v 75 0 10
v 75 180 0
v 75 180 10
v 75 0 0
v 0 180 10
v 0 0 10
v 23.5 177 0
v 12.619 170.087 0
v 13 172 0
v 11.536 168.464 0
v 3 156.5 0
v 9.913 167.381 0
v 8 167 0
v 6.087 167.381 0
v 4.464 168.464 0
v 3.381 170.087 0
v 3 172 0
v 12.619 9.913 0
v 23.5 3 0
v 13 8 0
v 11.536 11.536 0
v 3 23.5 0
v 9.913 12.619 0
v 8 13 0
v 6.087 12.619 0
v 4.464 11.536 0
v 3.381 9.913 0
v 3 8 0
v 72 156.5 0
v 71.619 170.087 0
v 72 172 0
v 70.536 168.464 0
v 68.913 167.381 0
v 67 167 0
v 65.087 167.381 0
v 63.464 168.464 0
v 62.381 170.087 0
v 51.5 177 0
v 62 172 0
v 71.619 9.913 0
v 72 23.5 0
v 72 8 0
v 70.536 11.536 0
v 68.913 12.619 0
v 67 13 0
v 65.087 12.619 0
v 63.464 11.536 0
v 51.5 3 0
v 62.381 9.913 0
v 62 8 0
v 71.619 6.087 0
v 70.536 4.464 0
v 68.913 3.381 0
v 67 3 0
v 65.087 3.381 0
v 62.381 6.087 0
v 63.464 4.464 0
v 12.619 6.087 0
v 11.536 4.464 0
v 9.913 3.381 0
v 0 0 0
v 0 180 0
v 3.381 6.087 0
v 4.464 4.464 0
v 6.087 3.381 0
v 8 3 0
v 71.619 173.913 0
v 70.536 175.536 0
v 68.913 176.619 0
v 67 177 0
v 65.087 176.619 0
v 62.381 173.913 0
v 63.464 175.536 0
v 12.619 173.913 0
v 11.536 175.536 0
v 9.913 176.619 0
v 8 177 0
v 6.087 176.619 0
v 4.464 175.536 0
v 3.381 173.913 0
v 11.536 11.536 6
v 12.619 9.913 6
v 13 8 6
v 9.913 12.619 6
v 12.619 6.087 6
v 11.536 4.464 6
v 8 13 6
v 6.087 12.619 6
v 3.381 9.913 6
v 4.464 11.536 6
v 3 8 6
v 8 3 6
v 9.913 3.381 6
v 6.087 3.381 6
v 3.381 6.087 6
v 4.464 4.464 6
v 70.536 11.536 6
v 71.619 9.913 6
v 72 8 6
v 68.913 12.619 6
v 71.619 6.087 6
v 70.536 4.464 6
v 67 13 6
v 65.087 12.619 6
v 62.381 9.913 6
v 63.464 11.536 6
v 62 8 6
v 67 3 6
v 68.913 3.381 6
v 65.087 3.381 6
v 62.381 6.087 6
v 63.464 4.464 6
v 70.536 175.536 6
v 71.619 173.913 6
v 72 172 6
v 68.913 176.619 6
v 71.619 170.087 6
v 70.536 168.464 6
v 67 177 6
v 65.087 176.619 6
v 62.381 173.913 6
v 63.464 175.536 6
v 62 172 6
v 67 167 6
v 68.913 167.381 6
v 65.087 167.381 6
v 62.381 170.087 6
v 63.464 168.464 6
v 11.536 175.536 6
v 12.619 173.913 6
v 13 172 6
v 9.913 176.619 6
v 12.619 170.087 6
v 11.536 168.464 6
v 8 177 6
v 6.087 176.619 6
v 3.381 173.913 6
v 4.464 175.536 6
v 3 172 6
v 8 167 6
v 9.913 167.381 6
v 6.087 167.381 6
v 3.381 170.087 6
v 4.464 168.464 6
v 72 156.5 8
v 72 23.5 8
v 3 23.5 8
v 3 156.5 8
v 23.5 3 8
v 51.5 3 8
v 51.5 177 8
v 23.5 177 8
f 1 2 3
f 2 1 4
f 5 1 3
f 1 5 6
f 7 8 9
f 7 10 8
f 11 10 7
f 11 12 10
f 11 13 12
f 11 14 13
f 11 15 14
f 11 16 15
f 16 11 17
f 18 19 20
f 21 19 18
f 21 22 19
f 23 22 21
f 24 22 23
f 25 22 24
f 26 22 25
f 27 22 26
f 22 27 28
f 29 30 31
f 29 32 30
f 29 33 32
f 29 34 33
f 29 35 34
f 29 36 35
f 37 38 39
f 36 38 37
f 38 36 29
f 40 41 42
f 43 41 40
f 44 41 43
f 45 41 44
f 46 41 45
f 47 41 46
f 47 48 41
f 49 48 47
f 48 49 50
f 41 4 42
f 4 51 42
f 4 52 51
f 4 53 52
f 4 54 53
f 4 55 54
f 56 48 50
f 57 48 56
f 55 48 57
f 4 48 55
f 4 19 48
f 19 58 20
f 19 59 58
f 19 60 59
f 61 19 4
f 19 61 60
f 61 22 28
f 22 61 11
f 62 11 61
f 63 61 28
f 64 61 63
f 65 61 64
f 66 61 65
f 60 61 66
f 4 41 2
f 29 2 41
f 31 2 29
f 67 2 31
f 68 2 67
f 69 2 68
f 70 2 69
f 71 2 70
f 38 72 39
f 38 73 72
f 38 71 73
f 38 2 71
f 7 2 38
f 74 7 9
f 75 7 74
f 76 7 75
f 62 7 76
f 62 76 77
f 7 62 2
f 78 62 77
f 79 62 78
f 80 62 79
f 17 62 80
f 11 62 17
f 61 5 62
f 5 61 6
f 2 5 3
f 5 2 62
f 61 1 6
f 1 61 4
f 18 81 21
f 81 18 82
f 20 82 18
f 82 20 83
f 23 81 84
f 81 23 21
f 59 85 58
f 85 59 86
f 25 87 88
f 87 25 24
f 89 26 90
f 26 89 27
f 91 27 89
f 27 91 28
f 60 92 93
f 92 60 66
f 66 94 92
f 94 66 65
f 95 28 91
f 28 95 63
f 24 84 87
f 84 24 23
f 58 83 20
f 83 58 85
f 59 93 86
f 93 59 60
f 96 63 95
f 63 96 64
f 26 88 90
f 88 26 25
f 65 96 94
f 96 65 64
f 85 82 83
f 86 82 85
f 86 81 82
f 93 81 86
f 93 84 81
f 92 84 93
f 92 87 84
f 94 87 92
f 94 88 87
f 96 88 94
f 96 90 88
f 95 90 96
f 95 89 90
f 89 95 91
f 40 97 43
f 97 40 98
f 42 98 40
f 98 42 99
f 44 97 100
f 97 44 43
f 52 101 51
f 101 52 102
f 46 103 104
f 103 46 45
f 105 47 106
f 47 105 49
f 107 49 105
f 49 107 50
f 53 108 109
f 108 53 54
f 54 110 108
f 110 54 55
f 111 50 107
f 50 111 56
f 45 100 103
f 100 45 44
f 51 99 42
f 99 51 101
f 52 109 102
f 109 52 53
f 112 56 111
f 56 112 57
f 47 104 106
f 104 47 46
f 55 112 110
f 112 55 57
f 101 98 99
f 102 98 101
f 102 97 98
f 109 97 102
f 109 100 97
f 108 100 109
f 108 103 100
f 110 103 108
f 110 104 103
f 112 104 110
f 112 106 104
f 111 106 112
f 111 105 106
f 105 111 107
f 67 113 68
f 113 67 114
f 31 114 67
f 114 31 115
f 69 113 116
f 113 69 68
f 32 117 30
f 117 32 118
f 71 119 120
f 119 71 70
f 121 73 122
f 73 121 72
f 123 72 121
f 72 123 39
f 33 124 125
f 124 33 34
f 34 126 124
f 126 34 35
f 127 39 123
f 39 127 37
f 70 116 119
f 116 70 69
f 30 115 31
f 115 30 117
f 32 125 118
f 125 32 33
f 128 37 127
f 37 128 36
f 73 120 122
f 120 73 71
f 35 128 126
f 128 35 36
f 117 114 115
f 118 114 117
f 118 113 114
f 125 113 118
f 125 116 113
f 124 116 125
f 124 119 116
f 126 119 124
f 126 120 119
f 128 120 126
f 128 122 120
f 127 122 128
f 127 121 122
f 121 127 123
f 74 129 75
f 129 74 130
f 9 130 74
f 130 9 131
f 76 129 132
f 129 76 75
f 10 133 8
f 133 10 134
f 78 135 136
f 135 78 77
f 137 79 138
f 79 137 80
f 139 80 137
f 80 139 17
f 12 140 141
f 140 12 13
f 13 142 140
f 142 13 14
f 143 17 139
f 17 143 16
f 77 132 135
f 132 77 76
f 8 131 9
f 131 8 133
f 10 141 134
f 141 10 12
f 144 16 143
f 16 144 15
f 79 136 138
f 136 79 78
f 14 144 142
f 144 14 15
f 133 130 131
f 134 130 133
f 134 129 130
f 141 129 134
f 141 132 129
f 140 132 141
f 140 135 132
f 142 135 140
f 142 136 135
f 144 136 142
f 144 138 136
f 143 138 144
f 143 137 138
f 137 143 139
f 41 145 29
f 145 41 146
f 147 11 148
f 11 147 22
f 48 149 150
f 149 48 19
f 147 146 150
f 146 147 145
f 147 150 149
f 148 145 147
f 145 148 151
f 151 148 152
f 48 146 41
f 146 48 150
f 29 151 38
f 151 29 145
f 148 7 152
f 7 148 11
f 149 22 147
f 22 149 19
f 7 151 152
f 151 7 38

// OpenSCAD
// Leg dimensions
pegHeight = 0;
totalHeight = 20;
legRadius = 5;

//table dimensions
width = 180;
height = 10;
depth = 75;
borderPadding = 3;
pegOffsetFromTop = 4;
hollow = true;
hollowAmount = 8;
hollowPadding = 3;

//Vars
legPadding = legRadius + borderPadding;
legHeight = height-totalHeight-pegOffsetFromTop;
fullHollowPadding = ((legRadius*3.5) + borderPadding) + hollowPadding;
hollowWidth = width - (fullHollowPadding * 2);
hollowDepth = depth - (fullHollowPadding * 2);
hollowHeight = hollowAmount+1;


difference(){
	cube([depth,width,height]);
	translate([legPadding , legPadding , legHeight])
		leg();
	translate([depth-legPadding, legPadding , legHeight])
		leg();
	translate([depth-legPadding, width-legPadding , legHeight])
		leg();
	translate([legPadding, width-legPadding , legHeight])
		leg();
	if(hollow==true){
		hull(){
		translate([fullHollowPadding , hollowPadding , -1])
		#cube([hollowDepth,(width-(hollowPadding*2)),hollowHeight]);
		translate([hollowPadding , fullHollowPadding, -1])
		#cube([(depth-(hollowPadding*2)),hollowWidth,hollowHeight]);
}
	}
}




module leg(){
	difference(){
		cylinder(r=legRadius, h=totalHeight);
		if (pegHeight > 0){
			translate([0,0,totalHeight-pegHeight])
			difference(){
				cylinder(r=legRadius+1, h=pegHeight+1);
				cylinder(r=legRadius/2, h=pegHeight+1, $fn=4);
			}
		}
	}
}
